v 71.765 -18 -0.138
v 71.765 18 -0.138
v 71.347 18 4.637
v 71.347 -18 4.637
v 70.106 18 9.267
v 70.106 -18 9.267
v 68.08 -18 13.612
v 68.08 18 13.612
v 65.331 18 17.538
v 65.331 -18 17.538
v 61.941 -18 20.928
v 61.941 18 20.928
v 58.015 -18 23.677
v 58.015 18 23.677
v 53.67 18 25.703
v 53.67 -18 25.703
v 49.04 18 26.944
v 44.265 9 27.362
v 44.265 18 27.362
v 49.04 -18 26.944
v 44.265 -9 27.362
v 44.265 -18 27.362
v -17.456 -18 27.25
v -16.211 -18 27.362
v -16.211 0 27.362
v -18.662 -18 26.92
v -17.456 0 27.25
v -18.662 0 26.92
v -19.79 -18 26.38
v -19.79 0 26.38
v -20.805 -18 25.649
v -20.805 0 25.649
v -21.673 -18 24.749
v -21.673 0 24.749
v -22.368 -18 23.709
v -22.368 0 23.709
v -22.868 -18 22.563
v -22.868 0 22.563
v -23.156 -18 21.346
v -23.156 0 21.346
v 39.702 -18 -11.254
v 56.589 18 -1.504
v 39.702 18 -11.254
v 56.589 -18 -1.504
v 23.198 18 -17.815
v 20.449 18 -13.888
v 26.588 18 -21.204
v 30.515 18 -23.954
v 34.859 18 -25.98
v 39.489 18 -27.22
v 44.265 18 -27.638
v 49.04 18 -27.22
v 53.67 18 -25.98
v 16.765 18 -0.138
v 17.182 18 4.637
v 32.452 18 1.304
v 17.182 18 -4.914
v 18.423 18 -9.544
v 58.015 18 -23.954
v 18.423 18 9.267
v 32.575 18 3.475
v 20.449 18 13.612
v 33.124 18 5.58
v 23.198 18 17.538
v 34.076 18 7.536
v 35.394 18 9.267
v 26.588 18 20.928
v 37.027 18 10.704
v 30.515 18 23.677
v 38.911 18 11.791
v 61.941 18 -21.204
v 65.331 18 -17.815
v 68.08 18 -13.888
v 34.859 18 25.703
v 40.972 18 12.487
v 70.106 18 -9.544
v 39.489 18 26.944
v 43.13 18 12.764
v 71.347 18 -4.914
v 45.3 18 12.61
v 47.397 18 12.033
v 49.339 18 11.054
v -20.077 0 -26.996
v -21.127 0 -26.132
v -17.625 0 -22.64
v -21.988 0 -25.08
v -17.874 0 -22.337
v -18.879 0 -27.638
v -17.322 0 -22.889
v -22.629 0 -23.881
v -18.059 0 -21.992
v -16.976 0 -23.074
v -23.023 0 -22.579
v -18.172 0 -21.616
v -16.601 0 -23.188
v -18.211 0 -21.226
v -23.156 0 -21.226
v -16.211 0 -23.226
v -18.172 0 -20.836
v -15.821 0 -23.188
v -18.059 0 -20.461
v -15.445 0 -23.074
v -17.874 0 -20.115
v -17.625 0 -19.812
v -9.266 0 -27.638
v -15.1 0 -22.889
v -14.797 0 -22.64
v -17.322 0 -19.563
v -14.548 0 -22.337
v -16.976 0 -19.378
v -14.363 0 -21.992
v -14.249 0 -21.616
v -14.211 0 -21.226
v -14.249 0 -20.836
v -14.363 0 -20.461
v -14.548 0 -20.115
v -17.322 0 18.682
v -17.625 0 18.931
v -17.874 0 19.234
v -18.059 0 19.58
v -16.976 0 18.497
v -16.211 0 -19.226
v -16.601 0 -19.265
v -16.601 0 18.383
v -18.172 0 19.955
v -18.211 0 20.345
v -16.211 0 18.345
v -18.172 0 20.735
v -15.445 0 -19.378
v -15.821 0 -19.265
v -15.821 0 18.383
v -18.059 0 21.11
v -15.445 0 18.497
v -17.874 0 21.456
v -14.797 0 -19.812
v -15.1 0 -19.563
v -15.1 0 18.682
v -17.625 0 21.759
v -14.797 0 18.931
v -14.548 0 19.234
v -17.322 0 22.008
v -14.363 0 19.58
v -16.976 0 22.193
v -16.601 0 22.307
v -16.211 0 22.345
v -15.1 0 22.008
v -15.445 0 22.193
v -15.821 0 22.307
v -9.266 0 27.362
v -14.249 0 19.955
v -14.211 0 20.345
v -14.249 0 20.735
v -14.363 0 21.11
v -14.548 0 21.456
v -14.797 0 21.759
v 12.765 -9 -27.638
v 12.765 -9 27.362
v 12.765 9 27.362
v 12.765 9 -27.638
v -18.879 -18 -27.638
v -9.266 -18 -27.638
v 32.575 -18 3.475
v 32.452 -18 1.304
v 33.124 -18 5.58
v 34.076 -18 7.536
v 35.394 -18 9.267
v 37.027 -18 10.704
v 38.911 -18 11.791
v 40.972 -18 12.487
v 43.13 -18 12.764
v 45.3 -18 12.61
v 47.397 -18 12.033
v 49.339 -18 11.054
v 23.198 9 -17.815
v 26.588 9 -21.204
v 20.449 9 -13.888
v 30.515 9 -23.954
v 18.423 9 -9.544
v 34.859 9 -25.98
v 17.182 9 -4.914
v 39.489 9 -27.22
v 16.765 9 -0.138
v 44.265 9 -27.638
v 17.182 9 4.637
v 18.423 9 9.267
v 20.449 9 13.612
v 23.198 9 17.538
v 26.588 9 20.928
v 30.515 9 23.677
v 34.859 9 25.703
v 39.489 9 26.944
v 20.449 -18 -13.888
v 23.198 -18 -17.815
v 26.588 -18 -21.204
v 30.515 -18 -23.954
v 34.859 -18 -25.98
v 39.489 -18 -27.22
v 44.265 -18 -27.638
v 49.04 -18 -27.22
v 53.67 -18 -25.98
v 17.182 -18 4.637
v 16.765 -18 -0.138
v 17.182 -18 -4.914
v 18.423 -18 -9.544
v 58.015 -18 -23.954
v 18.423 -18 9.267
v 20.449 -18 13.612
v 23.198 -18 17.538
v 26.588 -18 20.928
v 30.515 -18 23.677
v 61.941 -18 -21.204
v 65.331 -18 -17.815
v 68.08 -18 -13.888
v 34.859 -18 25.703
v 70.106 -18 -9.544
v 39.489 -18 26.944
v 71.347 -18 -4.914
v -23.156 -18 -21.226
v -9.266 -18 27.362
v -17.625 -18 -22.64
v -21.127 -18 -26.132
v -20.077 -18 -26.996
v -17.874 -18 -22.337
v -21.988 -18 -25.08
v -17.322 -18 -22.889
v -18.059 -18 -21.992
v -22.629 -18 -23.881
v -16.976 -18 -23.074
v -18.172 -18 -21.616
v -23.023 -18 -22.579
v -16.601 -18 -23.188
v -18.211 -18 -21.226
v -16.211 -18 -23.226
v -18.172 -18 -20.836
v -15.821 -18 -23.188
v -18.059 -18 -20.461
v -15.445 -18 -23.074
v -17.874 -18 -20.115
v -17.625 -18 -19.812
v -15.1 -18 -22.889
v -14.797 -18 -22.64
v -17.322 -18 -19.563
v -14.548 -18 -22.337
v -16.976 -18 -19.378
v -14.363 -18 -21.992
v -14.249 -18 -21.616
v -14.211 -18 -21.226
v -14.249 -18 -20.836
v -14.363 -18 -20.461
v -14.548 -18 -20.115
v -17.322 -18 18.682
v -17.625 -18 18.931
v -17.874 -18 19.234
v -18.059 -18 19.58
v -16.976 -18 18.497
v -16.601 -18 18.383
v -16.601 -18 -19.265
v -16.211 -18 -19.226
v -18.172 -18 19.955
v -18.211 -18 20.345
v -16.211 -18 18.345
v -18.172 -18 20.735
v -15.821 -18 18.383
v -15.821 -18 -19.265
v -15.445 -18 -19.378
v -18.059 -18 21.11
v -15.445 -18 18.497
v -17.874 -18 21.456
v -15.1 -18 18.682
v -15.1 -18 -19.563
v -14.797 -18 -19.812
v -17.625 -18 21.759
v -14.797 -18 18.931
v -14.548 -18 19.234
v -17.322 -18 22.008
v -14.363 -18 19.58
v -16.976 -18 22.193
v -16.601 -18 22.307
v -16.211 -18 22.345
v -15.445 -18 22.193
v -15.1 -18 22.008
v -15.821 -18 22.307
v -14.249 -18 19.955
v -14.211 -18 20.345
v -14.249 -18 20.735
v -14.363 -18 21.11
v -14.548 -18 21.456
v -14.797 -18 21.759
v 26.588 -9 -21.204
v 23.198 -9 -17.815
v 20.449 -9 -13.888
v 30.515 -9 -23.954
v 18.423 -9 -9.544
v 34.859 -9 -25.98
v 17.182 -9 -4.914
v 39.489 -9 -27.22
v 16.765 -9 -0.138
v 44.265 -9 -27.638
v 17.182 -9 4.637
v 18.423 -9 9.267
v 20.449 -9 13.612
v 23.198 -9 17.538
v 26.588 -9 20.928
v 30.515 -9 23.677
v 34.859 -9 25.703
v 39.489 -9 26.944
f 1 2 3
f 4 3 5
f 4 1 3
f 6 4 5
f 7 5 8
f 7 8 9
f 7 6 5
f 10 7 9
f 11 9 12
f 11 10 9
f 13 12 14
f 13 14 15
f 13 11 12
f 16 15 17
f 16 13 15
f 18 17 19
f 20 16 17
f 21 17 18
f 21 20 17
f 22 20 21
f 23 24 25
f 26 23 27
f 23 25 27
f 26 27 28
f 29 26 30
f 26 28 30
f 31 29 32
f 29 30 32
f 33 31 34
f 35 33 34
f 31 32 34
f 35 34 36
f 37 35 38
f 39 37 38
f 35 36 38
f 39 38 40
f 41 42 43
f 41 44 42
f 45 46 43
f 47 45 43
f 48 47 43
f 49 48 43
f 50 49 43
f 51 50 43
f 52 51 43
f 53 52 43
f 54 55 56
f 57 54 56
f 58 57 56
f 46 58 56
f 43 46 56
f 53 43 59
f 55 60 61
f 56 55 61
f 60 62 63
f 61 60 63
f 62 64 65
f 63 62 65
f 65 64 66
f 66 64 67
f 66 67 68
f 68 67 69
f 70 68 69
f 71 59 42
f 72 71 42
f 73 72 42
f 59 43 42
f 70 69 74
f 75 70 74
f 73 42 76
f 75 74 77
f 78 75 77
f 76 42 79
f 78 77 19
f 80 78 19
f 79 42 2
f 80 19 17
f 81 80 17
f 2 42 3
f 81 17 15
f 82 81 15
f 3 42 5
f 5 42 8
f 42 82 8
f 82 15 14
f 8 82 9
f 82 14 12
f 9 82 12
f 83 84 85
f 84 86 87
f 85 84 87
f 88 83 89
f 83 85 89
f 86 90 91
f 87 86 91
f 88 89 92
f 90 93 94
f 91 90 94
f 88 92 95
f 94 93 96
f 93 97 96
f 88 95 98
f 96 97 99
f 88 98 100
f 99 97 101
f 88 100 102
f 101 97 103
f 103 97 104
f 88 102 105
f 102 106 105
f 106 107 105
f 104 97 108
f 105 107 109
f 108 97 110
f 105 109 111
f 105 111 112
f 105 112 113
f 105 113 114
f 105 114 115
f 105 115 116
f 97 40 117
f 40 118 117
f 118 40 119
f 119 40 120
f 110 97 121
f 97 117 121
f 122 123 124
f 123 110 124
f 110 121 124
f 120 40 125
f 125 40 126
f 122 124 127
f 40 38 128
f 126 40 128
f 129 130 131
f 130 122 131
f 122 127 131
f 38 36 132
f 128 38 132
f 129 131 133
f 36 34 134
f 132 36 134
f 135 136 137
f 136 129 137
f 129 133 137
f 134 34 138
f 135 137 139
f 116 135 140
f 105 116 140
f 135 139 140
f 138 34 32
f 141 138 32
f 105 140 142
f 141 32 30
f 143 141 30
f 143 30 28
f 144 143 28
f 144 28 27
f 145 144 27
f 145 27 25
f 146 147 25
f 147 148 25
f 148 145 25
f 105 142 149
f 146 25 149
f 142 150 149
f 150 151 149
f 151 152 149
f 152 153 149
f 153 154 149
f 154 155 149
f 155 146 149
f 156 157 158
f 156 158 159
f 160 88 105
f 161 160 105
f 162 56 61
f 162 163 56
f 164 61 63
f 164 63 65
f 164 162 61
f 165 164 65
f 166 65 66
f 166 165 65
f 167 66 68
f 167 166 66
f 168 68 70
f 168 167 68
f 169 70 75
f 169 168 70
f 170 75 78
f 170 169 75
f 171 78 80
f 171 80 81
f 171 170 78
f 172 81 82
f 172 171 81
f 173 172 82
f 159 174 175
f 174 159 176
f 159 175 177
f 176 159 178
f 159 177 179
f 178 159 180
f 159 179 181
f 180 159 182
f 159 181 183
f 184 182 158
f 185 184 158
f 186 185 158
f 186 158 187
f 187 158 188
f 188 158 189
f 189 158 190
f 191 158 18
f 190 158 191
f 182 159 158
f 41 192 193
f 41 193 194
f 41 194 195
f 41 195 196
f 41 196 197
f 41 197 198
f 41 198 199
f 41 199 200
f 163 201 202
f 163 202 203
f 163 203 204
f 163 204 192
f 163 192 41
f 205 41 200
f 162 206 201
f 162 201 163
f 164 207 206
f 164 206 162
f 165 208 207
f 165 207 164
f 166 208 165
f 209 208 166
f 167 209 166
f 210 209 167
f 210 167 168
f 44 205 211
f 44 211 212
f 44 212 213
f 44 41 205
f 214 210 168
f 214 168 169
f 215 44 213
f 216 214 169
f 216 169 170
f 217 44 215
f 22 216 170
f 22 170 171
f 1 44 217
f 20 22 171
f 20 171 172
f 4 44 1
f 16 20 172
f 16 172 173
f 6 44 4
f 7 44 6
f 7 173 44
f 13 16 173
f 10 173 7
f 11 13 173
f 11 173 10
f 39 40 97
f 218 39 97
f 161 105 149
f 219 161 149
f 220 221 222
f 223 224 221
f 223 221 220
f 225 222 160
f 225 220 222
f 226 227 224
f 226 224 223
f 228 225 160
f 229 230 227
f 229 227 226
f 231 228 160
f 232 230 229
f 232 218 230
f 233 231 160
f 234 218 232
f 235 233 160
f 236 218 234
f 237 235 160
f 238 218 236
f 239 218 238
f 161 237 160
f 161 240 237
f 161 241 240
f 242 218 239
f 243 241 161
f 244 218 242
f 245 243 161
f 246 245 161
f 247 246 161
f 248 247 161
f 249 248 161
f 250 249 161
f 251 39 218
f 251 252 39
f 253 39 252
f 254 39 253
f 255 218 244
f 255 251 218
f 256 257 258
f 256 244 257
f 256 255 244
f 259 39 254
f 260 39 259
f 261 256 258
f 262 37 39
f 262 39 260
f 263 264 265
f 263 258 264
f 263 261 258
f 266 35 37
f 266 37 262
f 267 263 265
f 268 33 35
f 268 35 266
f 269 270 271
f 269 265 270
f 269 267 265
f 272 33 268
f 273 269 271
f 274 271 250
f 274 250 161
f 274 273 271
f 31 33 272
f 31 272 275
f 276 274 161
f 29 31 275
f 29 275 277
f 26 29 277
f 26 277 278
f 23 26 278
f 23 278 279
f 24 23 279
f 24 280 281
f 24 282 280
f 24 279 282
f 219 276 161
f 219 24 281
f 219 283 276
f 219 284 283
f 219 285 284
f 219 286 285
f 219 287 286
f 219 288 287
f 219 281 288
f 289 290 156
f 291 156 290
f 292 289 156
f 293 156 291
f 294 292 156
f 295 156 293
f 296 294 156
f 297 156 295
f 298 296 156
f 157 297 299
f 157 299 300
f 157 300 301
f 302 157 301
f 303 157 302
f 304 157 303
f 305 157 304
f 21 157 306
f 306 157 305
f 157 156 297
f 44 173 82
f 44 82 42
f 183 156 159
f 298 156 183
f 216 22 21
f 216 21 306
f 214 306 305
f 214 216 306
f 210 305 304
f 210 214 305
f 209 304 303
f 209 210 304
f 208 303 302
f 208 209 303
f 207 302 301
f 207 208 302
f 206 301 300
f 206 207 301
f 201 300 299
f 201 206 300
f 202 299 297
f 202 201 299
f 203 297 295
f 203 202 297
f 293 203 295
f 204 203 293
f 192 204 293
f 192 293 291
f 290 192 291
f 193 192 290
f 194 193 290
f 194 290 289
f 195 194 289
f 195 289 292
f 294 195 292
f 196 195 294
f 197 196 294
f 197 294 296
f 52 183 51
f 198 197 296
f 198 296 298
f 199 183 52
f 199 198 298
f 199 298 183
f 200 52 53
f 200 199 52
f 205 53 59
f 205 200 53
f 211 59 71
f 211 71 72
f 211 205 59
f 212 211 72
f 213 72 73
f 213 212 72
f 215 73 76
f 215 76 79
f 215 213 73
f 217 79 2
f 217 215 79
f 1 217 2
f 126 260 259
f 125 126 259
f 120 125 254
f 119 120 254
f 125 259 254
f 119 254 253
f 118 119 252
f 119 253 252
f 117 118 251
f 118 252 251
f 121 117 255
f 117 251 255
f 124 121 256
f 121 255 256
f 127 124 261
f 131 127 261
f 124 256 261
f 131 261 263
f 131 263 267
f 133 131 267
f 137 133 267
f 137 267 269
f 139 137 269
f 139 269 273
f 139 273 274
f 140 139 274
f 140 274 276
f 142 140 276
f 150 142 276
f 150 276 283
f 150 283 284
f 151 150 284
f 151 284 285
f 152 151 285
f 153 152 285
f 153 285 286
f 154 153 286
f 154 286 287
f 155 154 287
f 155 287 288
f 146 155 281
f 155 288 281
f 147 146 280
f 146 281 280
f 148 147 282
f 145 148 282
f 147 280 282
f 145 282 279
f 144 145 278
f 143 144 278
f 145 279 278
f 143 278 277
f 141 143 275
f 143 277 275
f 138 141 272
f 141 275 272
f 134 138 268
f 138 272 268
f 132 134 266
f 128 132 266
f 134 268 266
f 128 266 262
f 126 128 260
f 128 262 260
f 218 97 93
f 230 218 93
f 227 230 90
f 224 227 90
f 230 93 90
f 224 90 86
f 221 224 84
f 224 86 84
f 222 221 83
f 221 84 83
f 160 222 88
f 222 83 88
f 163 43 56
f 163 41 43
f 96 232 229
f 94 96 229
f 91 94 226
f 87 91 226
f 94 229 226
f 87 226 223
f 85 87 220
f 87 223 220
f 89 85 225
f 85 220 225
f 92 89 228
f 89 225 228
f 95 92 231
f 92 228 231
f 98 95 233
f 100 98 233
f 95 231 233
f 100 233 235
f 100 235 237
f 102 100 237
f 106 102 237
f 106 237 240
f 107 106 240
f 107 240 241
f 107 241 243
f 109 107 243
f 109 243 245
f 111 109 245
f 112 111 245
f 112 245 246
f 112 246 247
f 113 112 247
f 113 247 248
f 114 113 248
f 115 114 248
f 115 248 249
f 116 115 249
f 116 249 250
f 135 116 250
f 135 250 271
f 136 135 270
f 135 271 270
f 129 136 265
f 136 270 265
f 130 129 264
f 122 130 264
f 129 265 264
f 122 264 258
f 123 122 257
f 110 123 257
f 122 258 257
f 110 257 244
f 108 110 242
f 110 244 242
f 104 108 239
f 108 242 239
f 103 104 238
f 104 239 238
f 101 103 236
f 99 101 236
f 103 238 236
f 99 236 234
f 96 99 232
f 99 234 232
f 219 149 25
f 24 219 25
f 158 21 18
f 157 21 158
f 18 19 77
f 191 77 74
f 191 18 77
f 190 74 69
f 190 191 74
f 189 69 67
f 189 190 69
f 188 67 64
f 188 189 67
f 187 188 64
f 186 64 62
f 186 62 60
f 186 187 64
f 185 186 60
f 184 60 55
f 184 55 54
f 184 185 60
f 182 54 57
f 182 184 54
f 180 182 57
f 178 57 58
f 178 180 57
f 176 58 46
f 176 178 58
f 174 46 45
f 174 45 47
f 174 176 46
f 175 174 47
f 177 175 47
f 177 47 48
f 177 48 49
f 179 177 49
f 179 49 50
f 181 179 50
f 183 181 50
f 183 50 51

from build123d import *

# Parameters (mm, degrees)
F1_DEPTH      = 18
F2_D          = 4
F3_DEPTH      = 18
F3_DEPTH_BACK = 18
F4_DEPTH      = 9
F4_DEPTH_BACK = 9


with BuildPart() as f1:
    # F0 (on Front) → F1 (new body)
    with BuildSketch(Plane.XZ):
        with BuildLine():
            Line((-9.2657440613, -27.6382645078), (-9.2657440613, 27.3617354922))
            Line((-9.2657440613, 27.3617354922), (-16.2107785353, 27.3617354922))
            ThreePointArc((-16.2107785353, 27.3617354922), (-20.8049267476, 25.6486528507), (-23.1558130092, 21.3458417093))
            Line((-23.1558130092, 21.3458417093), (-23.1558130092, -21.2262201912))
            ThreePointArc((-23.1558130092, -21.2262201912), (-21.9884821339, -25.0799929513), (-18.8789045899, -27.6382645078))
            Line((-18.8789045899, -27.6382645078), (-9.2657440613, -27.6382645078))
        make_face()
    extrude(amount=F1_DEPTH)

    # F2 (through all)
    with Locations(Plane(origin=(0, 0, 0), x_dir=(1, 0, 0), z_dir=(0, 1, 0))):
        with Locations((-16.2108130092, -20.3449890159), (-16.2108130092, 21.2262201912)):
            Hole(F2_D / 2)


with BuildPart() as f3:
    # F0 (on Front) → F3 (new body, two sides)
    with BuildSketch(Plane.XZ) as f3_sk:
        with BuildLine():
            ThreePointArc((71.7645256658, -0.1382645078), (63.7099621485, 19.3071719749), (44.2645256658, 27.3617354922))
            ThreePointArc((44.2645256658, 27.3617354922), (16.7645256658, -0.1382645078), (44.2645256658, -27.6382645078))
            ThreePointArc((44.2645256658, -27.6382645078), (63.7099621485, -19.5837009904), (71.7645256658, -0.1382645078))
        make_face()
        with BuildLine():
            Line((49.3394077535, 11.0536389664), (56.5894077535, -1.5037293885))
            Line((56.5894077535, -1.5037293885), (39.7019123797, -11.2537293885))
            Line((39.7019123797, -11.2537293885), (32.4519123797, 1.3036389664))
            ThreePointArc((32.4519123797, 1.3036389664), (37.942103665, 11.2943487169), (49.3394077535, 11.0536389664))
        make_face(mode=Mode.SUBTRACT)
    extrude(amount=F3_DEPTH)
    extrude(f3_sk.sketch, amount=-F3_DEPTH_BACK)

    # F0 (on Front) → F4 (join, two sides)
    with BuildSketch(Plane.XZ) as f4_sk:
        with BuildLine():
            ThreePointArc((44.2645256658, -27.6382645078), (16.7645256658, -0.1382645078), (44.2645256658, 27.3617354922))
            Line((44.2645256658, 27.3617354922), (12.7645256658, 27.3617354922))
            Line((12.7645256658, 27.3617354922), (12.7645256658, -27.6382645078))
            Line((12.7645256658, -27.6382645078), (44.2645256658, -27.6382645078))
        make_face()
    extrude(amount=F4_DEPTH)
    extrude(f4_sk.sketch, amount=-F4_DEPTH_BACK)


solid = Compound([f1.part, f3.part])
